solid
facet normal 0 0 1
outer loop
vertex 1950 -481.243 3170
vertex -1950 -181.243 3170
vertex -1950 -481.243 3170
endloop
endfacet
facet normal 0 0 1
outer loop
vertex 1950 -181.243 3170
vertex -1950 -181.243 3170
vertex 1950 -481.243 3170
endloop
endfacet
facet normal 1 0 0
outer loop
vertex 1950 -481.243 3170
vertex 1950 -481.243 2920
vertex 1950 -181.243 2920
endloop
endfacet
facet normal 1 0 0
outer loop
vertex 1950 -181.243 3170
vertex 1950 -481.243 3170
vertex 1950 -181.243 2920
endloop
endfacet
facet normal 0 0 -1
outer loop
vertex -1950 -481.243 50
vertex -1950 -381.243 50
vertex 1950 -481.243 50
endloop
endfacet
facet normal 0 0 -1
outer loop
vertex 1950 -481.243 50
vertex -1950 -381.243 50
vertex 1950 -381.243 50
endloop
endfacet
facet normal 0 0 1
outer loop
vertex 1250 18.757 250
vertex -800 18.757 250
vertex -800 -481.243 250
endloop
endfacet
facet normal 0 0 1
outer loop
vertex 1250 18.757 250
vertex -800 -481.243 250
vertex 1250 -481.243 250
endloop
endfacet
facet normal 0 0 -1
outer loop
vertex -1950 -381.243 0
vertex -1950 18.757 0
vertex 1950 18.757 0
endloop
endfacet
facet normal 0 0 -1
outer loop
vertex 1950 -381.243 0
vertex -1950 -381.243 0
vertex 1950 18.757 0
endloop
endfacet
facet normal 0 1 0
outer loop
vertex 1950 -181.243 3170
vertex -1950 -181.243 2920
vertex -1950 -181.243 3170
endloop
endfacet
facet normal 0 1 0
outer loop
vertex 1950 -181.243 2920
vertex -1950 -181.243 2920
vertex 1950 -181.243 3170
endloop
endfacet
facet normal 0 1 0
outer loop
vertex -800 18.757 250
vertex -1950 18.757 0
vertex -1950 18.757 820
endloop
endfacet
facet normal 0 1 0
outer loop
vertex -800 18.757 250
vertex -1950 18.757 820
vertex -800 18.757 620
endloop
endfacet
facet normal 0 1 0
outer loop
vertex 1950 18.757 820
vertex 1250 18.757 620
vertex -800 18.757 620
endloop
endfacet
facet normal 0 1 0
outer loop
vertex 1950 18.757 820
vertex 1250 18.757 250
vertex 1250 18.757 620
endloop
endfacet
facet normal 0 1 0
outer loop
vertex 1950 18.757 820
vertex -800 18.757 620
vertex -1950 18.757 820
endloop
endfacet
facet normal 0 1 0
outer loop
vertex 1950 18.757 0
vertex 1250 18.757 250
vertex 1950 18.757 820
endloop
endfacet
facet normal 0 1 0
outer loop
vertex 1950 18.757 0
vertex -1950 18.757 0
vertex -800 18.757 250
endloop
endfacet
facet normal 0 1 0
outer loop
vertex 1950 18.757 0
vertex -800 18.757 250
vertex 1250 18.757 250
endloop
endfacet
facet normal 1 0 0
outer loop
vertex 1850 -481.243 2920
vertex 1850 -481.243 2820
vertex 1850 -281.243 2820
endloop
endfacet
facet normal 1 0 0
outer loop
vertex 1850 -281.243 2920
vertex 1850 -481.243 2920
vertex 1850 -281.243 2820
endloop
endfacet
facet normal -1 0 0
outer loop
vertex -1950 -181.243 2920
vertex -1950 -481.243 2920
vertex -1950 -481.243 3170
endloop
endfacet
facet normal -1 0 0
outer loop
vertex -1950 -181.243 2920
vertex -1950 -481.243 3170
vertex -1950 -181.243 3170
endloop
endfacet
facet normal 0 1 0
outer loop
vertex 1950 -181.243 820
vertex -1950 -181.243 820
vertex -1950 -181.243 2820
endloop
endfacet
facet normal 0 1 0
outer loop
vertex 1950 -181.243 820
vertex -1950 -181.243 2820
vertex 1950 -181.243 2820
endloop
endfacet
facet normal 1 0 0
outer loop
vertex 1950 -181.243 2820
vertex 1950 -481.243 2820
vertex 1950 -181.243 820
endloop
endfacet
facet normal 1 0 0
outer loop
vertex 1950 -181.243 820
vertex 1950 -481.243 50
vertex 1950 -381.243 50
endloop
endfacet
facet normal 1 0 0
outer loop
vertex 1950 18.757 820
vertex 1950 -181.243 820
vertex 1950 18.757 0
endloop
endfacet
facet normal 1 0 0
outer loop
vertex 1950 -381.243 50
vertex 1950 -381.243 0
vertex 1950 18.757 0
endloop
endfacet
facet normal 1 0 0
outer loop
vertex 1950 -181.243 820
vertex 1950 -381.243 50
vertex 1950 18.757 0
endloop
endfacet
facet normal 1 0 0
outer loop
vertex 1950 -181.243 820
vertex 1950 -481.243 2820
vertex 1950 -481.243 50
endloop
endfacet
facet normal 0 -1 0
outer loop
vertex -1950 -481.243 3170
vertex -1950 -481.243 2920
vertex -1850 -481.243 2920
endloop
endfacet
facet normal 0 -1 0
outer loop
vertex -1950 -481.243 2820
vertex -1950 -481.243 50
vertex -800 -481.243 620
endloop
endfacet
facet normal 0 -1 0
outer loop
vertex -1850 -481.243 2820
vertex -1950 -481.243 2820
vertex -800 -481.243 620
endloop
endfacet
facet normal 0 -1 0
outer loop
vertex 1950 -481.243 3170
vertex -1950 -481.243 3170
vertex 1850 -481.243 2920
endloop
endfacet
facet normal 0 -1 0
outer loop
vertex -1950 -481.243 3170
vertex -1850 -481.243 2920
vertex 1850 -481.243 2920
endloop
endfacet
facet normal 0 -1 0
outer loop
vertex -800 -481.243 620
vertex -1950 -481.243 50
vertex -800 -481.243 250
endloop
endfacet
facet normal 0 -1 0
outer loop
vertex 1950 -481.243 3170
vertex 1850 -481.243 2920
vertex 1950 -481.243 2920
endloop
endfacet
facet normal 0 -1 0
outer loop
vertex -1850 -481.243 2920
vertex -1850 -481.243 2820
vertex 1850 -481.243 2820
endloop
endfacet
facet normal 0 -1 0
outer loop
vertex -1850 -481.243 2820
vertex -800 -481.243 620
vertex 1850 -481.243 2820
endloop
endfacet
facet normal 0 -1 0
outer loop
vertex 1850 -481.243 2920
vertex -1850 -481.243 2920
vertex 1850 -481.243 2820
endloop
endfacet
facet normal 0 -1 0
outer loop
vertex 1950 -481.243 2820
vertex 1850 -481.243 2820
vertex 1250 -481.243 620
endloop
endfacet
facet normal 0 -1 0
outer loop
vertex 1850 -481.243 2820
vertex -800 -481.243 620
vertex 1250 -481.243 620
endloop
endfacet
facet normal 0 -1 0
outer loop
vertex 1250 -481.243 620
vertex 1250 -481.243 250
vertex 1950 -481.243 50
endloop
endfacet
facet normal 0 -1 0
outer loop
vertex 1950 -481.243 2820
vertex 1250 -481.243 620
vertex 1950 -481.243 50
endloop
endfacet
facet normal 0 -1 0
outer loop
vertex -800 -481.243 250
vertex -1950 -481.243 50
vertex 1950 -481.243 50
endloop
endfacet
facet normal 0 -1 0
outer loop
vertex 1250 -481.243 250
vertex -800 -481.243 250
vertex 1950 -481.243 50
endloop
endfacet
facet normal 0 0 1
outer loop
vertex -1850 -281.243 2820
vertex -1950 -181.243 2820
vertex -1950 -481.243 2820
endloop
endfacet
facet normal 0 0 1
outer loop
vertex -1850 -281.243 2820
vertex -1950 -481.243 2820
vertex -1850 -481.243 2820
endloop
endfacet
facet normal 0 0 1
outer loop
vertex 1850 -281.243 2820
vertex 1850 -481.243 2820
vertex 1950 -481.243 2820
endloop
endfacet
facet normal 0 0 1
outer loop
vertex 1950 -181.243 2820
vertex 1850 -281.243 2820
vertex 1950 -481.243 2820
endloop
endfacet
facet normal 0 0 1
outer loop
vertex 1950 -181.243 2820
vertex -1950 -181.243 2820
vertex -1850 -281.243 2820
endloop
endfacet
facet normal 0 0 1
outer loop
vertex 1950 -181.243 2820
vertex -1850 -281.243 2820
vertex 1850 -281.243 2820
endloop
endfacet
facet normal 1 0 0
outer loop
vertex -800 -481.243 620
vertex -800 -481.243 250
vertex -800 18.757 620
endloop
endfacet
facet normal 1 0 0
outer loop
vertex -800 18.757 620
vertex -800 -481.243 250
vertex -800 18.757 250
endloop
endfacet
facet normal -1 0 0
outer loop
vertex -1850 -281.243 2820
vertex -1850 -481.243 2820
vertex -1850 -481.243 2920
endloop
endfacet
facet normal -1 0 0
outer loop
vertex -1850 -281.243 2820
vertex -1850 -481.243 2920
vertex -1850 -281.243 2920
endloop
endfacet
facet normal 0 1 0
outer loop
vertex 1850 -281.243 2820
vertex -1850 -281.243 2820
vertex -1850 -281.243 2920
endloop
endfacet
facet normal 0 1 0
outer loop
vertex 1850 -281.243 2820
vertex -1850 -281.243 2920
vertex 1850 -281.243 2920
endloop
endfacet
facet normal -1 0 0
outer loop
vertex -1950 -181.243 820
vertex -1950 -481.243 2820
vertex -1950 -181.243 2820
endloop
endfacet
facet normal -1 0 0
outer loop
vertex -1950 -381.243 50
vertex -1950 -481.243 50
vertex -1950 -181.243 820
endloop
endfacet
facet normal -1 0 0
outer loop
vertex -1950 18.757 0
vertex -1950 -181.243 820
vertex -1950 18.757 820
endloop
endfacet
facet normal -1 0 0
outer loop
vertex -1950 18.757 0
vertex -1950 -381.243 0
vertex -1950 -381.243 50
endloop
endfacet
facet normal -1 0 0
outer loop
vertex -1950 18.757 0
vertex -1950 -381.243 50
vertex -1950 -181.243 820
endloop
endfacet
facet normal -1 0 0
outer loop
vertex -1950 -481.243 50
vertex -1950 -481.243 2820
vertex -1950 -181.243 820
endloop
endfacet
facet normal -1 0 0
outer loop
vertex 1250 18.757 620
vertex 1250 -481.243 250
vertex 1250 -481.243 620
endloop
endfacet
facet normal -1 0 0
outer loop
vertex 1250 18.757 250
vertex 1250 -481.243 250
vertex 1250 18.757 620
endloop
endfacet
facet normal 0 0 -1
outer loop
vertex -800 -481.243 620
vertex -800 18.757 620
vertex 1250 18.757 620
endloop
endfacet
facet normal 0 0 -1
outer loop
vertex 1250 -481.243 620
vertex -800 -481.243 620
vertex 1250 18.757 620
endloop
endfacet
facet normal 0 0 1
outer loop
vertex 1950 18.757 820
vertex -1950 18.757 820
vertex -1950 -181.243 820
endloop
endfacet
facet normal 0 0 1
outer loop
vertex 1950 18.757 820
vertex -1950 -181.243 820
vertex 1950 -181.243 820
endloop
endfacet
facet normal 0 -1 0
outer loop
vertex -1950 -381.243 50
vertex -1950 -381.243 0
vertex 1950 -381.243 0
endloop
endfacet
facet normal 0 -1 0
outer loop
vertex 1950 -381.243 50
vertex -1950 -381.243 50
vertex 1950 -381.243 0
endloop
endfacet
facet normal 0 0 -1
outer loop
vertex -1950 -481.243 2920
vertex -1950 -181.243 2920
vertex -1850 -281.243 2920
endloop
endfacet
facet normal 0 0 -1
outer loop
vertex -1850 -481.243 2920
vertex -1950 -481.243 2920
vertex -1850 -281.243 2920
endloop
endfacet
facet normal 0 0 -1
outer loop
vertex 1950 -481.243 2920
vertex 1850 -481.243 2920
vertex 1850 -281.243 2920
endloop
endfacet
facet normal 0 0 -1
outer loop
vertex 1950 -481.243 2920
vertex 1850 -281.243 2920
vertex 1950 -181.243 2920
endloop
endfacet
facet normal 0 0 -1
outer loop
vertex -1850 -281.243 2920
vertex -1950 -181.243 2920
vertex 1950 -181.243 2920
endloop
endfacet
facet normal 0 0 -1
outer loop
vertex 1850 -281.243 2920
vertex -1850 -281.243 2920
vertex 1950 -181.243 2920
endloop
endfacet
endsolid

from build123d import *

# Parameters (mm, degrees)
F0_W      = 3900
F0_H      = 400
F1_DEPTH  = 50
F2_W      = 3900
F2_H      = 500
F3_DEPTH  = 200
F4_W      = 700
F4_H      = 500
F4_W_2    = 1150
F5_DEPTH  = 370
F6_W      = 3900
F6_H      = 500
F7_DEPTH  = 200
F8_W      = 3900
F8_H      = 300
F9_DEPTH  = 2000
F10_W     = 3700
F10_H     = 200
F11_DEPTH = 100
F12_W     = 3900
F12_H     = 300
F13_DEPTH = 250


# Not quite as in the source:
# - a feature names something its author has since deleted; it is built from what else it names


with BuildPart() as f1:
    # F0 (on Top) → F1 (new body)
    with BuildSketch(Plane.XY):
        with Locations((0, -181.2429684355)):
            Rectangle(F0_W, F0_H)
    extrude(amount=F1_DEPTH)

    # F2 (on face) → F3 (join)
    with BuildSketch(Plane.XY.offset(50)):
        with Locations((0, -231.2429684355)):
            Rectangle(F2_W, F2_H)
    extrude(amount=F3_DEPTH)

    # F4 (on face) → F5 (join)
    with BuildSketch(Plane.XY.offset(250)):
        with Locations((1600, -231.2429684355)):
            Rectangle(F4_W, F4_H)
        with Locations((-1375, -231.2429684355)):
            Rectangle(F4_W_2, F4_H)
    extrude(amount=F5_DEPTH)

    # F6 (on face) → F7 (join)
    with BuildSketch(Plane.XY.offset(620)):
        with Locations((0, -231.2429684355)):
            Rectangle(F6_W, F6_H)
    extrude(amount=F7_DEPTH)

    # F8 (on face) → F9 (join)
    with BuildSketch(Plane.XY.offset(820)):
        with Locations((0, -331.2429684355)):
            Rectangle(F8_W, F8_H)
    extrude(amount=F9_DEPTH)

    # F10 (on face) → F11 (join)
    with BuildSketch(Plane.XY.offset(2820)):
        with Locations((0, -381.2429684355)):
            Rectangle(F10_W, F10_H)
    extrude(amount=F11_DEPTH)

    # F12 (on face) → F13 (join)
    with BuildSketch(Plane.XY.offset(2920)):
        with Locations((0, -331.2429684355)):
            Rectangle(F12_W, F12_H)
    extrude(amount=F13_DEPTH)


solid = f1.part
